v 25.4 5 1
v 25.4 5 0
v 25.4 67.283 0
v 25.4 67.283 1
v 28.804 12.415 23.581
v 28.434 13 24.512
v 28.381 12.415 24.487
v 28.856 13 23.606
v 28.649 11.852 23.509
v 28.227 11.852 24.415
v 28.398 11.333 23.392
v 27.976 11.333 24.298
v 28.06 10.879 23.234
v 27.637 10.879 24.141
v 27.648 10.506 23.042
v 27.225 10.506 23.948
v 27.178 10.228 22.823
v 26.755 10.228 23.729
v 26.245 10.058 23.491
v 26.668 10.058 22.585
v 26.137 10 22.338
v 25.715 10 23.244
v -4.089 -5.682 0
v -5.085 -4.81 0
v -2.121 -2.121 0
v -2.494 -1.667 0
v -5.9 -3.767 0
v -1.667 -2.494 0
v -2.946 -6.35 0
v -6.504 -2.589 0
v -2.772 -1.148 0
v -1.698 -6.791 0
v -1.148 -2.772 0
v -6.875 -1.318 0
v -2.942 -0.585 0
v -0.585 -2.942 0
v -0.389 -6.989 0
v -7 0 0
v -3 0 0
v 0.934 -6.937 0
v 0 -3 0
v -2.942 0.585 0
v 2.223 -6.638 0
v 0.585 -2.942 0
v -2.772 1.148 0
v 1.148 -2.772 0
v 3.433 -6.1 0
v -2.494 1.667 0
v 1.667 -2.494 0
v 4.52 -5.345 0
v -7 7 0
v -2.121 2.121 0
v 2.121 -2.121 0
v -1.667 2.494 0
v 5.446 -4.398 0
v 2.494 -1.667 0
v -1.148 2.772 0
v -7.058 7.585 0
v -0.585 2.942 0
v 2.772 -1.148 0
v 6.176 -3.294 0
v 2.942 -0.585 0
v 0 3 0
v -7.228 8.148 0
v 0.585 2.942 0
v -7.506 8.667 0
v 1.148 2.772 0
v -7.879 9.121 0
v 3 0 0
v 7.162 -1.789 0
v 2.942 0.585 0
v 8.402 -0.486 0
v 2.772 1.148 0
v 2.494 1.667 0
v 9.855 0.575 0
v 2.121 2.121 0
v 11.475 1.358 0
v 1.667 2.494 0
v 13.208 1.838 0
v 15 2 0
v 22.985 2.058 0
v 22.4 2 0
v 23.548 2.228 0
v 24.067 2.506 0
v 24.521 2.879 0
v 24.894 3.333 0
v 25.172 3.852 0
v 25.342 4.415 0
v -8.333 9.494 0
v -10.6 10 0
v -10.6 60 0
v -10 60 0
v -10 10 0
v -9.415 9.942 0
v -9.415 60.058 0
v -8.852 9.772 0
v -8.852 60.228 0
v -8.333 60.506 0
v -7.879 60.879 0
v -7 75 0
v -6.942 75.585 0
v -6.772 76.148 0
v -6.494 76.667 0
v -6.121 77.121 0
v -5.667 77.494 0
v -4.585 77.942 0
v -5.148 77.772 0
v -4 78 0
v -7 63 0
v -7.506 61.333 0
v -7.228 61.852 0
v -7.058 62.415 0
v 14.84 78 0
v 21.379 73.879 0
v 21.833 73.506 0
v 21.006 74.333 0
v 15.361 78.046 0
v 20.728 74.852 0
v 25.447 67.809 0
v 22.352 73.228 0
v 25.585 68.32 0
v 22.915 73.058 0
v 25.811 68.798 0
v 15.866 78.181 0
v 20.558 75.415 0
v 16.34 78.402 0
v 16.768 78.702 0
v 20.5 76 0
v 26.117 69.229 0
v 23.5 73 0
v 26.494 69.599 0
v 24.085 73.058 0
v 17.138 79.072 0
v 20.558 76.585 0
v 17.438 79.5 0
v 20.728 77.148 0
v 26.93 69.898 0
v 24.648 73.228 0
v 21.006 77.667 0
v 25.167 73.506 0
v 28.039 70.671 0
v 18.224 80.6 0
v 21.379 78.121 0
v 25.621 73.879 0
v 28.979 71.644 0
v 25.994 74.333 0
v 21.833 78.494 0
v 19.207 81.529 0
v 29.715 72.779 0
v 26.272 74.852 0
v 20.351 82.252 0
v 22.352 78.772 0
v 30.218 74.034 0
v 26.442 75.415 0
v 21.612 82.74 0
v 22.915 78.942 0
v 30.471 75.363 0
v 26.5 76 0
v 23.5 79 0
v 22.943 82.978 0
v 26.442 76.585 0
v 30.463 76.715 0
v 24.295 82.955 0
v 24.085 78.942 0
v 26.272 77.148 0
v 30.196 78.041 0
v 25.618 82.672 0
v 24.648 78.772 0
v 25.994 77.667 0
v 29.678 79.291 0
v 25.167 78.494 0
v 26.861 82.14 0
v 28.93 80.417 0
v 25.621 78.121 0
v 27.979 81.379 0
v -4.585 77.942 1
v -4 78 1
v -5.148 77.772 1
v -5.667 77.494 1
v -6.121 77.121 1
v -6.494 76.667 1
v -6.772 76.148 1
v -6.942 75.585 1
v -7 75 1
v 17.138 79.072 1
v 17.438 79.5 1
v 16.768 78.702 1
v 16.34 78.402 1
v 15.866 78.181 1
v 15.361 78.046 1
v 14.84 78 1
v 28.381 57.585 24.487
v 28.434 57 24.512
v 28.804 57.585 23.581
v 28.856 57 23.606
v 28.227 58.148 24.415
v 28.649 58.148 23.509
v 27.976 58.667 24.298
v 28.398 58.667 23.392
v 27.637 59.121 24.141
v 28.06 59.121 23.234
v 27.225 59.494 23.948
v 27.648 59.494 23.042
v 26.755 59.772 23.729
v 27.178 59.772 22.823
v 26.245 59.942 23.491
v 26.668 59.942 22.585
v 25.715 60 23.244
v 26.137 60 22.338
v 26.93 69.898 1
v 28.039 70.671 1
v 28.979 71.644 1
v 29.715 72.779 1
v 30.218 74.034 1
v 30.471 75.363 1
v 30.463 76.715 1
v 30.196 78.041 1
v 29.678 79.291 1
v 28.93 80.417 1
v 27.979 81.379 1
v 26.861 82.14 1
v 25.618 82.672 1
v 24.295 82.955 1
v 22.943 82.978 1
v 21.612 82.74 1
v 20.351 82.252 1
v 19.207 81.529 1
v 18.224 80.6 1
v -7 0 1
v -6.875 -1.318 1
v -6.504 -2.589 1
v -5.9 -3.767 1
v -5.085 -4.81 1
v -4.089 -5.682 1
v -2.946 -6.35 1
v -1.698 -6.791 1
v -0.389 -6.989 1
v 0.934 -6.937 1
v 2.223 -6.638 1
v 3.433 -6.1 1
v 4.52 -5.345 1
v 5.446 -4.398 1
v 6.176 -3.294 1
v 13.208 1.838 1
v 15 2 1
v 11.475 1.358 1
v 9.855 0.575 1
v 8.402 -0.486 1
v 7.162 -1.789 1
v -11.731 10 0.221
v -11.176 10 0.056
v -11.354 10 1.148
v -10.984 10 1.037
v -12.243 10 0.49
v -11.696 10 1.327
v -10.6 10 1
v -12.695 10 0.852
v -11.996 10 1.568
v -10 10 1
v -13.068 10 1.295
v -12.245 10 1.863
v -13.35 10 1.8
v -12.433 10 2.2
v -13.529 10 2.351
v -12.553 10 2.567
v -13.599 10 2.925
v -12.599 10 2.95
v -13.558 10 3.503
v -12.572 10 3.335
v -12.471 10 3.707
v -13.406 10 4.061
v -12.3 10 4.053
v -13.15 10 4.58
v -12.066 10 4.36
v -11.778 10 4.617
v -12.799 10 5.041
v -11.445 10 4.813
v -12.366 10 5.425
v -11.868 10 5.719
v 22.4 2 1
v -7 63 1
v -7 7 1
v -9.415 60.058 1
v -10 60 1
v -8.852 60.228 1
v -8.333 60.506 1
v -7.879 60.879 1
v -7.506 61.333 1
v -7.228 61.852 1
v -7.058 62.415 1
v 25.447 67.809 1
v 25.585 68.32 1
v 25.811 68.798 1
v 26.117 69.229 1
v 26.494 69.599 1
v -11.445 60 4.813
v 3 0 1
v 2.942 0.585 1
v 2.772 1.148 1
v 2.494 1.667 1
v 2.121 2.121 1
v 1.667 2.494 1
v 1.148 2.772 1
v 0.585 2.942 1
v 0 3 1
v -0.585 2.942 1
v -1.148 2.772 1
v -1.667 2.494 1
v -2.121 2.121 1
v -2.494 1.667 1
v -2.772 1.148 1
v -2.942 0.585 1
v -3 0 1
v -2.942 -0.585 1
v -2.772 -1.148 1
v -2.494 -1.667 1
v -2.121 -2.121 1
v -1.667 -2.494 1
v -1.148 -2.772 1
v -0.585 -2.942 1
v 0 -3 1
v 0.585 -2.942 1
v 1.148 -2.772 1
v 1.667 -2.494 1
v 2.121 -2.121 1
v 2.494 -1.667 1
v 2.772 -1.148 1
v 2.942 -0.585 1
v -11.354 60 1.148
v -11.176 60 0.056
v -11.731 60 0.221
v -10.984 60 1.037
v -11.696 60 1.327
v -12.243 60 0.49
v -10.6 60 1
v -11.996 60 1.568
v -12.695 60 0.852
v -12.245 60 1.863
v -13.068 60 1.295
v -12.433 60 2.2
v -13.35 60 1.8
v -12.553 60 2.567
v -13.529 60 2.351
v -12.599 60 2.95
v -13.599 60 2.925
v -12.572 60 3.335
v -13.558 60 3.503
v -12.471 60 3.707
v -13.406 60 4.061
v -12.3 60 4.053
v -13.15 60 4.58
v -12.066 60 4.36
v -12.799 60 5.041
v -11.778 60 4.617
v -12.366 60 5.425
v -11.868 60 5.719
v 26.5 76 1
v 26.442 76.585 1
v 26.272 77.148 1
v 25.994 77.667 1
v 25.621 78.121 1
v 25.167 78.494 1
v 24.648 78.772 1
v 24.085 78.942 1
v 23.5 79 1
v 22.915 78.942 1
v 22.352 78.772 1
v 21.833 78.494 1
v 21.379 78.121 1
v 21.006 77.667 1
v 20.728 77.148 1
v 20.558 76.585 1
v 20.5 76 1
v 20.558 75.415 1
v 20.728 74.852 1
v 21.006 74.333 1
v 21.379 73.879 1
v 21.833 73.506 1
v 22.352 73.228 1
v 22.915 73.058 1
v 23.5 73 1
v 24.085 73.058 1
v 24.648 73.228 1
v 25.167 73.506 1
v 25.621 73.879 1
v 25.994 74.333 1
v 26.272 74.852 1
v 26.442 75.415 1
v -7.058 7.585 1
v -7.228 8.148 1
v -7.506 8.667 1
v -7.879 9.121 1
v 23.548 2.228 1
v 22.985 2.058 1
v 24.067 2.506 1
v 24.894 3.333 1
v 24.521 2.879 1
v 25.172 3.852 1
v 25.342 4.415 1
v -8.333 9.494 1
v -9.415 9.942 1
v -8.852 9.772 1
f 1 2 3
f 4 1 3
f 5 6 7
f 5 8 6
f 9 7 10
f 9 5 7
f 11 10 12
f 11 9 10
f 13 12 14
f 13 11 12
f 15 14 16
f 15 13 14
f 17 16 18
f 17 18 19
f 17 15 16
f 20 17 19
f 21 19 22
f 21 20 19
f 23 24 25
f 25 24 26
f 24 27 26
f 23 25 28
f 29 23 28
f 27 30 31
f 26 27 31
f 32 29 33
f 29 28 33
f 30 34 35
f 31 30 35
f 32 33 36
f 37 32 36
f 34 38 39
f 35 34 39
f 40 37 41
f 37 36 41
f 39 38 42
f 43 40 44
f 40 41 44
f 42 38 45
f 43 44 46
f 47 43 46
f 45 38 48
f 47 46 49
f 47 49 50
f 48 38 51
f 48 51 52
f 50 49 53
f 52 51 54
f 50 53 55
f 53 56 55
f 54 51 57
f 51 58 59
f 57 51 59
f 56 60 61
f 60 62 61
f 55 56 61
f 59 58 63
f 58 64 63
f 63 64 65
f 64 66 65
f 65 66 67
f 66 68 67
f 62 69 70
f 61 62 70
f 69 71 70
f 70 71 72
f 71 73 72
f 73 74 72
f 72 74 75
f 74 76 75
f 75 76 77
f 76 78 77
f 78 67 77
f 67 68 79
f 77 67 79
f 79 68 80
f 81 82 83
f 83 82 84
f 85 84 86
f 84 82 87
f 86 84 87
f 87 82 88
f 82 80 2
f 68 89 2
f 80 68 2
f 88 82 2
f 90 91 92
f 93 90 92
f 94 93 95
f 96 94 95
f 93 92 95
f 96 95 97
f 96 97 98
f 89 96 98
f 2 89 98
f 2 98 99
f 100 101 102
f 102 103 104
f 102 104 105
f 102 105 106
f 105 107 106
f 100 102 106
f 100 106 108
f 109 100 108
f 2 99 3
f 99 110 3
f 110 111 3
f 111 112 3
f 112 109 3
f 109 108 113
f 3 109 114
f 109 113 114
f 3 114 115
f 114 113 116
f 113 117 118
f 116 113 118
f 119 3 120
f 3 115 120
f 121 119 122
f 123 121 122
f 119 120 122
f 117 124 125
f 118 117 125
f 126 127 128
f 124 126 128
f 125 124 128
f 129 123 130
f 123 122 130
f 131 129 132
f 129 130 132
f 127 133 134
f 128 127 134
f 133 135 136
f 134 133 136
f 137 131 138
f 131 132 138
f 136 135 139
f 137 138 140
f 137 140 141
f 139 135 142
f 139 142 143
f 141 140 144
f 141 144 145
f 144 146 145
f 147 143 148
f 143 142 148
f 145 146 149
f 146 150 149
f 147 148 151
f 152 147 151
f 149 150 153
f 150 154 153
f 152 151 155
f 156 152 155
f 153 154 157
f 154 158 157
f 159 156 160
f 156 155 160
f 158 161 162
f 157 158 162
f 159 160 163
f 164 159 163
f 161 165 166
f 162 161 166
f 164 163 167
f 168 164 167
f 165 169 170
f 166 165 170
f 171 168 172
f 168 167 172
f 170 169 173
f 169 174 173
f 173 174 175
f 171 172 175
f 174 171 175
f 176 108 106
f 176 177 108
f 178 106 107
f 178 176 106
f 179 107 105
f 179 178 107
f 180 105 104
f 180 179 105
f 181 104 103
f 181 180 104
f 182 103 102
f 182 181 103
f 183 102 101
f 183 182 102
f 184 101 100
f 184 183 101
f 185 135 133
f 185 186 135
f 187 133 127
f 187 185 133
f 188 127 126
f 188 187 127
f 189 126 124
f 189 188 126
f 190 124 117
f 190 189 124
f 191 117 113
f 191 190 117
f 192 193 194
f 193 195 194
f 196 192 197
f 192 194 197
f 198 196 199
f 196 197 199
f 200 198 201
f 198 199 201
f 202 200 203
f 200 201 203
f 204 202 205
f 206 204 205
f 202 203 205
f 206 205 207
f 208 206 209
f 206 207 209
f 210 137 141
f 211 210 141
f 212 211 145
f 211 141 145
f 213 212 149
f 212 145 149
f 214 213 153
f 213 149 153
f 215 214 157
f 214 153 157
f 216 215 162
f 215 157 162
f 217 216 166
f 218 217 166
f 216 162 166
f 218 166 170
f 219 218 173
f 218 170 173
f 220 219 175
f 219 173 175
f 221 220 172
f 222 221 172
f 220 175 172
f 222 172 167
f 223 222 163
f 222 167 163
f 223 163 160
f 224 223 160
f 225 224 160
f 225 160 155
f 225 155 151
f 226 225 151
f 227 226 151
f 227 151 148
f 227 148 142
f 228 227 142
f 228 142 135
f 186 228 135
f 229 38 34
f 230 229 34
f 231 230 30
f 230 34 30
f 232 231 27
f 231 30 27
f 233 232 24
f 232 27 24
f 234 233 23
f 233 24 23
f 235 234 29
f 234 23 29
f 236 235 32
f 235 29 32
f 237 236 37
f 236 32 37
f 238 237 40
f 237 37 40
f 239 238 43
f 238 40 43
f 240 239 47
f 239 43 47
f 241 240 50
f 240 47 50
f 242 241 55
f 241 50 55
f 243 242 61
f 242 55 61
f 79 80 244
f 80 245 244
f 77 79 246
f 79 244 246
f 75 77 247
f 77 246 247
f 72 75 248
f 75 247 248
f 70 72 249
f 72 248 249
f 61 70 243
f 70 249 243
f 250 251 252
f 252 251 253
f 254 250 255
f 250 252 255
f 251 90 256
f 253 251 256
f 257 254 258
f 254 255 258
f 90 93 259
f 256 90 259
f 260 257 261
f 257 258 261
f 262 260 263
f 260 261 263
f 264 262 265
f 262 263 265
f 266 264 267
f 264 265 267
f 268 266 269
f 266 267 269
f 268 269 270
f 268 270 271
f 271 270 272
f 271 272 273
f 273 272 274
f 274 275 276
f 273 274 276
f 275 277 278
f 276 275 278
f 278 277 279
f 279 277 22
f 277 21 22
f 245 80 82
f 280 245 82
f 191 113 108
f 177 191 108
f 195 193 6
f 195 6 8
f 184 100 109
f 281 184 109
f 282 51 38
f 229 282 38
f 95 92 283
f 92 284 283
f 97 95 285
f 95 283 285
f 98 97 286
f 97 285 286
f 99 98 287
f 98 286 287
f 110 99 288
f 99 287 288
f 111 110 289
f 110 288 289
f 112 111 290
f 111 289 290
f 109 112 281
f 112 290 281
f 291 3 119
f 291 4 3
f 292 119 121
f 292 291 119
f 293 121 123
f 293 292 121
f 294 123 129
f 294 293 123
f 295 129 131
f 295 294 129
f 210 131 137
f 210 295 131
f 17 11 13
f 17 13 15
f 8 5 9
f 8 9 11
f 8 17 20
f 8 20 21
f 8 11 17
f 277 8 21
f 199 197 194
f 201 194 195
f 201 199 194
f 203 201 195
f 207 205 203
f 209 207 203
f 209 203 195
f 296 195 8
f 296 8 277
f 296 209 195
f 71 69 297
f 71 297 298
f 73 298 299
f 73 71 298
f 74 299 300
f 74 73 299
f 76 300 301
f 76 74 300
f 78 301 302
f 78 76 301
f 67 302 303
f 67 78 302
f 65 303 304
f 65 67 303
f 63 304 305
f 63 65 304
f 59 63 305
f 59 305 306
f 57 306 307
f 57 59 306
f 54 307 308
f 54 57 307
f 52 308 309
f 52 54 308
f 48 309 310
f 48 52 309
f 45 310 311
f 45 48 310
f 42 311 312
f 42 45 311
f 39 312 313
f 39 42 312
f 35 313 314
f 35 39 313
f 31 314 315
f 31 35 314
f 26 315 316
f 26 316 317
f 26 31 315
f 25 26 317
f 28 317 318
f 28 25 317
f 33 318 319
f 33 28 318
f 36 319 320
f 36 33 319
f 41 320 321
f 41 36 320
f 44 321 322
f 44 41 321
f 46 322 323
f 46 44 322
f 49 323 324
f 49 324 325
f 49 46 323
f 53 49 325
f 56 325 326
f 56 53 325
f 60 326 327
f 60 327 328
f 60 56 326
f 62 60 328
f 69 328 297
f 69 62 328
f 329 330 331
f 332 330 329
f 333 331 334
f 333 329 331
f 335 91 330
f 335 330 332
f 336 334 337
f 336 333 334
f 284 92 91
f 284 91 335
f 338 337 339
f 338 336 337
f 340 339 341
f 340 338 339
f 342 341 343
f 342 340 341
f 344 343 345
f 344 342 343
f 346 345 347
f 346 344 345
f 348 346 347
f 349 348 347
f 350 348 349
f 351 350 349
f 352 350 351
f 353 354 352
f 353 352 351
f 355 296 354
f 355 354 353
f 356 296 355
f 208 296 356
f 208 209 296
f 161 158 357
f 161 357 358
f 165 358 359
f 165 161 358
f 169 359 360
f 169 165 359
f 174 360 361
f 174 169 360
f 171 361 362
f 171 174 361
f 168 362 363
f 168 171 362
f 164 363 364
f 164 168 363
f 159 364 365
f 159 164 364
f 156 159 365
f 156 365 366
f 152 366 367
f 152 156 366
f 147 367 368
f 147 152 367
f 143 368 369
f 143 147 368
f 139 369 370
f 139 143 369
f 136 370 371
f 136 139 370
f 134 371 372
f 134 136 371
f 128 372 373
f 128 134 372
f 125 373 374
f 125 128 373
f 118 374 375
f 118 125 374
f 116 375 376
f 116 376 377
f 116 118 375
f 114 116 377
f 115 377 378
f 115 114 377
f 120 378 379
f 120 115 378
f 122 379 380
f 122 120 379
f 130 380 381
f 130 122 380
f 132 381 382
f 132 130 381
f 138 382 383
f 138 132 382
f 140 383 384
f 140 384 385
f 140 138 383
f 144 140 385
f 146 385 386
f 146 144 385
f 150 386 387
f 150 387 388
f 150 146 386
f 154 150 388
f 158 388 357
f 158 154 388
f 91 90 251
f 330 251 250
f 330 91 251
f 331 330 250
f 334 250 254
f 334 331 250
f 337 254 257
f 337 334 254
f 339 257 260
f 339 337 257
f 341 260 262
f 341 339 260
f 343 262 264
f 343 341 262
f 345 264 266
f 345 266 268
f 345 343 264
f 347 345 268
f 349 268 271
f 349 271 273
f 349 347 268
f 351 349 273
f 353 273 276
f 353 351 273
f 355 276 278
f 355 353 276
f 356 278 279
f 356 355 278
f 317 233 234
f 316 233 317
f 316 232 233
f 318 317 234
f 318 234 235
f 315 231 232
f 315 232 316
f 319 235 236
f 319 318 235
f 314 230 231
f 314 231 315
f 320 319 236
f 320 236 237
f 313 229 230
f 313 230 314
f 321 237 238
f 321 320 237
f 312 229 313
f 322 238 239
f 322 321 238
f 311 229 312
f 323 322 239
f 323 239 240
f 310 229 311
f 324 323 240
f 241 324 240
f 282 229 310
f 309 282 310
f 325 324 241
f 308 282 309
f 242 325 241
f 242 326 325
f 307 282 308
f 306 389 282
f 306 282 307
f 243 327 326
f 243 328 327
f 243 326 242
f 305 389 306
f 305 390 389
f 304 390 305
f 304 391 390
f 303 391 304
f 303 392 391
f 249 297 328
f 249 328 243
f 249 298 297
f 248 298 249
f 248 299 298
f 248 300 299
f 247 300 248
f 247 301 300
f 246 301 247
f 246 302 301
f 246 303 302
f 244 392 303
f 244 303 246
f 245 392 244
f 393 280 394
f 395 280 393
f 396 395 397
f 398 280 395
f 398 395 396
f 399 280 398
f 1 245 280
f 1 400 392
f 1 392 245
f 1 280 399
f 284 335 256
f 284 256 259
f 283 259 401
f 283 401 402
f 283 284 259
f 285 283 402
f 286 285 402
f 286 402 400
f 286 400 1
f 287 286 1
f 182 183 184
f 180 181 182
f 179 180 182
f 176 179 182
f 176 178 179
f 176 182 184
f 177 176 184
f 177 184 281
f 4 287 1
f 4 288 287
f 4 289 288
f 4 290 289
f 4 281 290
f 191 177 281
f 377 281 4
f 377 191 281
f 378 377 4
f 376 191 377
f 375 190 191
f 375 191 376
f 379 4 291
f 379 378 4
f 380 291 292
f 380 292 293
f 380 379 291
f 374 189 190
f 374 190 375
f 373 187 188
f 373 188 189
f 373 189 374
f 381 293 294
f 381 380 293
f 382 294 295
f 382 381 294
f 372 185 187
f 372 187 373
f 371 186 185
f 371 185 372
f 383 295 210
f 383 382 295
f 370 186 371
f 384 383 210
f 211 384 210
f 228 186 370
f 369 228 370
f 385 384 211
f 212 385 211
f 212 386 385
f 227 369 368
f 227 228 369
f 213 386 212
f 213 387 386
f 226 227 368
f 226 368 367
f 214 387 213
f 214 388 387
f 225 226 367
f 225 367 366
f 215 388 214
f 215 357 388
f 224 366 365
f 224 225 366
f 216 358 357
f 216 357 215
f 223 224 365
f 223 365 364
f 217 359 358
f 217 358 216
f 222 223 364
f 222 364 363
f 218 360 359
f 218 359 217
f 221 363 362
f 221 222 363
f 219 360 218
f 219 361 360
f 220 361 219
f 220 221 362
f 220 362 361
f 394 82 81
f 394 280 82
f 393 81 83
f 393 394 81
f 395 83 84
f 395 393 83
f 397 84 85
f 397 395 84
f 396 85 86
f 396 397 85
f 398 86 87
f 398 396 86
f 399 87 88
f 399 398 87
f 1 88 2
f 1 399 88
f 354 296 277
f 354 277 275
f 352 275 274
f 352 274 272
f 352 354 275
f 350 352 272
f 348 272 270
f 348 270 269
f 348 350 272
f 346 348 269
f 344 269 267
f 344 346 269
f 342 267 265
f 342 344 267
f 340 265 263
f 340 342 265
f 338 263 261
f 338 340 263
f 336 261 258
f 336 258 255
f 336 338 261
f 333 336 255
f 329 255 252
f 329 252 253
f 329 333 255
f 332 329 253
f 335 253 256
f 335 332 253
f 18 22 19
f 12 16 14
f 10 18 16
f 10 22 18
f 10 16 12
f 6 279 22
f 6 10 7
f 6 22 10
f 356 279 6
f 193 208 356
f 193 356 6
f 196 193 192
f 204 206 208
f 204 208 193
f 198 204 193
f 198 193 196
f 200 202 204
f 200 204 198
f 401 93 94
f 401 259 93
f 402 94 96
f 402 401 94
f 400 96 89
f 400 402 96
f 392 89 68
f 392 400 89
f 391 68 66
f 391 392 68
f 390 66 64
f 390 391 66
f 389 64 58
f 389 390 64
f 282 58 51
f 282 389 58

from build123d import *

# Parameters (mm, degrees)
SKETCH1_R           = 3
BOSS_EXTRUDE1_DEPTH = 1
EDGE_FLANGE1_DEPTH  = 50
FILLET1_R           = 3
FILLET2_R           = 10


# Sheet-metal steps are written as plain solids
with BuildPart() as part:
    # Sketch1 → Boss-Extrude1 (new body)
    with BuildSketch(Plane.XY):
        with BuildLine():
            Line((6.708203932, 2), (25.4, 2))
            Line((25.4, 2), (25.4, 69.262789895))
            ThreePointArc((25.4, 69.262789895), (28.486423204, 80.912797943), (16.791796068, 78))
            Line((16.791796068, 78), (-7, 78))
            Line((-7, 78), (-7, 60))
            Line((-7, 60), (-10.6, 60))
            Line((-10.6, 60), (-10.6, 10))
            Line((-10.6, 10), (-7, 10))
            Line((-7, 10), (-7, 0))
            ThreePointArc((-7, 0), (1.010587075, -6.926666858), (6.708203932, 2))
        make_face()
        Circle(SKETCH1_R, mode=Mode.SUBTRACT)
        with Locations((23.5, 76)):
            Circle(SKETCH1_R, mode=Mode.SUBTRACT)
    extrude(amount=BOSS_EXTRUDE1_DEPTH)

    # Edge-Flange1 section (across the edge) → Edge-Flange1 (add)
    with BuildSketch(Plane(origin=(-19.621417007, 60, 1), x_dir=(0.4226182617407006, 0, -0.9063077870366494), z_dir=(0, -1, 0))):
        with BuildLine():
            Line((-1, 9.021417007), (-1, 53.489291496))
            Line((-1, 53.489291496), (0, 53.489291496))
            Line((0, 53.489291496), (0, 9.021417007))
            ThreePointArc((0, 9.021417007), (1.567120772, 7.068824993), (3.812615574, 8.176180484))
            Line((3.812615574, 8.176180484), (4.718923361, 7.753562222))
            ThreePointArc((4.718923361, 7.753562222), (1.350681158, 6.092528986), (-1, 9.021417007))
        make_face()
    extrude(amount=EDGE_FLANGE1_DEPTH)

    # Fillet1
    fillet1_edges = [part.edges().sort_by_distance(p)[0] for p in [
        (-7, 78, 0.5),
        (-7, 60, 0.5),
        (-7, 10, 0.5),
        (25.4, 2, 0.5),
        (25.4, 69.262789895, 0.5),
        (16.791796068, 78, 0.5),
        (28.645035268, 60, 24.058705287),
        (28.645035268, 10, 24.058705287),
    ]]
    fillet(fillet1_edges, radius=FILLET1_R)

    # Fillet2
    fillet2_edges = [part.edges().sort_by_distance(p)[0] for p in [
        (6.708203932, 2, 0.5),
    ]]
    fillet(fillet2_edges, radius=FILLET2_R)


solid = part.part
